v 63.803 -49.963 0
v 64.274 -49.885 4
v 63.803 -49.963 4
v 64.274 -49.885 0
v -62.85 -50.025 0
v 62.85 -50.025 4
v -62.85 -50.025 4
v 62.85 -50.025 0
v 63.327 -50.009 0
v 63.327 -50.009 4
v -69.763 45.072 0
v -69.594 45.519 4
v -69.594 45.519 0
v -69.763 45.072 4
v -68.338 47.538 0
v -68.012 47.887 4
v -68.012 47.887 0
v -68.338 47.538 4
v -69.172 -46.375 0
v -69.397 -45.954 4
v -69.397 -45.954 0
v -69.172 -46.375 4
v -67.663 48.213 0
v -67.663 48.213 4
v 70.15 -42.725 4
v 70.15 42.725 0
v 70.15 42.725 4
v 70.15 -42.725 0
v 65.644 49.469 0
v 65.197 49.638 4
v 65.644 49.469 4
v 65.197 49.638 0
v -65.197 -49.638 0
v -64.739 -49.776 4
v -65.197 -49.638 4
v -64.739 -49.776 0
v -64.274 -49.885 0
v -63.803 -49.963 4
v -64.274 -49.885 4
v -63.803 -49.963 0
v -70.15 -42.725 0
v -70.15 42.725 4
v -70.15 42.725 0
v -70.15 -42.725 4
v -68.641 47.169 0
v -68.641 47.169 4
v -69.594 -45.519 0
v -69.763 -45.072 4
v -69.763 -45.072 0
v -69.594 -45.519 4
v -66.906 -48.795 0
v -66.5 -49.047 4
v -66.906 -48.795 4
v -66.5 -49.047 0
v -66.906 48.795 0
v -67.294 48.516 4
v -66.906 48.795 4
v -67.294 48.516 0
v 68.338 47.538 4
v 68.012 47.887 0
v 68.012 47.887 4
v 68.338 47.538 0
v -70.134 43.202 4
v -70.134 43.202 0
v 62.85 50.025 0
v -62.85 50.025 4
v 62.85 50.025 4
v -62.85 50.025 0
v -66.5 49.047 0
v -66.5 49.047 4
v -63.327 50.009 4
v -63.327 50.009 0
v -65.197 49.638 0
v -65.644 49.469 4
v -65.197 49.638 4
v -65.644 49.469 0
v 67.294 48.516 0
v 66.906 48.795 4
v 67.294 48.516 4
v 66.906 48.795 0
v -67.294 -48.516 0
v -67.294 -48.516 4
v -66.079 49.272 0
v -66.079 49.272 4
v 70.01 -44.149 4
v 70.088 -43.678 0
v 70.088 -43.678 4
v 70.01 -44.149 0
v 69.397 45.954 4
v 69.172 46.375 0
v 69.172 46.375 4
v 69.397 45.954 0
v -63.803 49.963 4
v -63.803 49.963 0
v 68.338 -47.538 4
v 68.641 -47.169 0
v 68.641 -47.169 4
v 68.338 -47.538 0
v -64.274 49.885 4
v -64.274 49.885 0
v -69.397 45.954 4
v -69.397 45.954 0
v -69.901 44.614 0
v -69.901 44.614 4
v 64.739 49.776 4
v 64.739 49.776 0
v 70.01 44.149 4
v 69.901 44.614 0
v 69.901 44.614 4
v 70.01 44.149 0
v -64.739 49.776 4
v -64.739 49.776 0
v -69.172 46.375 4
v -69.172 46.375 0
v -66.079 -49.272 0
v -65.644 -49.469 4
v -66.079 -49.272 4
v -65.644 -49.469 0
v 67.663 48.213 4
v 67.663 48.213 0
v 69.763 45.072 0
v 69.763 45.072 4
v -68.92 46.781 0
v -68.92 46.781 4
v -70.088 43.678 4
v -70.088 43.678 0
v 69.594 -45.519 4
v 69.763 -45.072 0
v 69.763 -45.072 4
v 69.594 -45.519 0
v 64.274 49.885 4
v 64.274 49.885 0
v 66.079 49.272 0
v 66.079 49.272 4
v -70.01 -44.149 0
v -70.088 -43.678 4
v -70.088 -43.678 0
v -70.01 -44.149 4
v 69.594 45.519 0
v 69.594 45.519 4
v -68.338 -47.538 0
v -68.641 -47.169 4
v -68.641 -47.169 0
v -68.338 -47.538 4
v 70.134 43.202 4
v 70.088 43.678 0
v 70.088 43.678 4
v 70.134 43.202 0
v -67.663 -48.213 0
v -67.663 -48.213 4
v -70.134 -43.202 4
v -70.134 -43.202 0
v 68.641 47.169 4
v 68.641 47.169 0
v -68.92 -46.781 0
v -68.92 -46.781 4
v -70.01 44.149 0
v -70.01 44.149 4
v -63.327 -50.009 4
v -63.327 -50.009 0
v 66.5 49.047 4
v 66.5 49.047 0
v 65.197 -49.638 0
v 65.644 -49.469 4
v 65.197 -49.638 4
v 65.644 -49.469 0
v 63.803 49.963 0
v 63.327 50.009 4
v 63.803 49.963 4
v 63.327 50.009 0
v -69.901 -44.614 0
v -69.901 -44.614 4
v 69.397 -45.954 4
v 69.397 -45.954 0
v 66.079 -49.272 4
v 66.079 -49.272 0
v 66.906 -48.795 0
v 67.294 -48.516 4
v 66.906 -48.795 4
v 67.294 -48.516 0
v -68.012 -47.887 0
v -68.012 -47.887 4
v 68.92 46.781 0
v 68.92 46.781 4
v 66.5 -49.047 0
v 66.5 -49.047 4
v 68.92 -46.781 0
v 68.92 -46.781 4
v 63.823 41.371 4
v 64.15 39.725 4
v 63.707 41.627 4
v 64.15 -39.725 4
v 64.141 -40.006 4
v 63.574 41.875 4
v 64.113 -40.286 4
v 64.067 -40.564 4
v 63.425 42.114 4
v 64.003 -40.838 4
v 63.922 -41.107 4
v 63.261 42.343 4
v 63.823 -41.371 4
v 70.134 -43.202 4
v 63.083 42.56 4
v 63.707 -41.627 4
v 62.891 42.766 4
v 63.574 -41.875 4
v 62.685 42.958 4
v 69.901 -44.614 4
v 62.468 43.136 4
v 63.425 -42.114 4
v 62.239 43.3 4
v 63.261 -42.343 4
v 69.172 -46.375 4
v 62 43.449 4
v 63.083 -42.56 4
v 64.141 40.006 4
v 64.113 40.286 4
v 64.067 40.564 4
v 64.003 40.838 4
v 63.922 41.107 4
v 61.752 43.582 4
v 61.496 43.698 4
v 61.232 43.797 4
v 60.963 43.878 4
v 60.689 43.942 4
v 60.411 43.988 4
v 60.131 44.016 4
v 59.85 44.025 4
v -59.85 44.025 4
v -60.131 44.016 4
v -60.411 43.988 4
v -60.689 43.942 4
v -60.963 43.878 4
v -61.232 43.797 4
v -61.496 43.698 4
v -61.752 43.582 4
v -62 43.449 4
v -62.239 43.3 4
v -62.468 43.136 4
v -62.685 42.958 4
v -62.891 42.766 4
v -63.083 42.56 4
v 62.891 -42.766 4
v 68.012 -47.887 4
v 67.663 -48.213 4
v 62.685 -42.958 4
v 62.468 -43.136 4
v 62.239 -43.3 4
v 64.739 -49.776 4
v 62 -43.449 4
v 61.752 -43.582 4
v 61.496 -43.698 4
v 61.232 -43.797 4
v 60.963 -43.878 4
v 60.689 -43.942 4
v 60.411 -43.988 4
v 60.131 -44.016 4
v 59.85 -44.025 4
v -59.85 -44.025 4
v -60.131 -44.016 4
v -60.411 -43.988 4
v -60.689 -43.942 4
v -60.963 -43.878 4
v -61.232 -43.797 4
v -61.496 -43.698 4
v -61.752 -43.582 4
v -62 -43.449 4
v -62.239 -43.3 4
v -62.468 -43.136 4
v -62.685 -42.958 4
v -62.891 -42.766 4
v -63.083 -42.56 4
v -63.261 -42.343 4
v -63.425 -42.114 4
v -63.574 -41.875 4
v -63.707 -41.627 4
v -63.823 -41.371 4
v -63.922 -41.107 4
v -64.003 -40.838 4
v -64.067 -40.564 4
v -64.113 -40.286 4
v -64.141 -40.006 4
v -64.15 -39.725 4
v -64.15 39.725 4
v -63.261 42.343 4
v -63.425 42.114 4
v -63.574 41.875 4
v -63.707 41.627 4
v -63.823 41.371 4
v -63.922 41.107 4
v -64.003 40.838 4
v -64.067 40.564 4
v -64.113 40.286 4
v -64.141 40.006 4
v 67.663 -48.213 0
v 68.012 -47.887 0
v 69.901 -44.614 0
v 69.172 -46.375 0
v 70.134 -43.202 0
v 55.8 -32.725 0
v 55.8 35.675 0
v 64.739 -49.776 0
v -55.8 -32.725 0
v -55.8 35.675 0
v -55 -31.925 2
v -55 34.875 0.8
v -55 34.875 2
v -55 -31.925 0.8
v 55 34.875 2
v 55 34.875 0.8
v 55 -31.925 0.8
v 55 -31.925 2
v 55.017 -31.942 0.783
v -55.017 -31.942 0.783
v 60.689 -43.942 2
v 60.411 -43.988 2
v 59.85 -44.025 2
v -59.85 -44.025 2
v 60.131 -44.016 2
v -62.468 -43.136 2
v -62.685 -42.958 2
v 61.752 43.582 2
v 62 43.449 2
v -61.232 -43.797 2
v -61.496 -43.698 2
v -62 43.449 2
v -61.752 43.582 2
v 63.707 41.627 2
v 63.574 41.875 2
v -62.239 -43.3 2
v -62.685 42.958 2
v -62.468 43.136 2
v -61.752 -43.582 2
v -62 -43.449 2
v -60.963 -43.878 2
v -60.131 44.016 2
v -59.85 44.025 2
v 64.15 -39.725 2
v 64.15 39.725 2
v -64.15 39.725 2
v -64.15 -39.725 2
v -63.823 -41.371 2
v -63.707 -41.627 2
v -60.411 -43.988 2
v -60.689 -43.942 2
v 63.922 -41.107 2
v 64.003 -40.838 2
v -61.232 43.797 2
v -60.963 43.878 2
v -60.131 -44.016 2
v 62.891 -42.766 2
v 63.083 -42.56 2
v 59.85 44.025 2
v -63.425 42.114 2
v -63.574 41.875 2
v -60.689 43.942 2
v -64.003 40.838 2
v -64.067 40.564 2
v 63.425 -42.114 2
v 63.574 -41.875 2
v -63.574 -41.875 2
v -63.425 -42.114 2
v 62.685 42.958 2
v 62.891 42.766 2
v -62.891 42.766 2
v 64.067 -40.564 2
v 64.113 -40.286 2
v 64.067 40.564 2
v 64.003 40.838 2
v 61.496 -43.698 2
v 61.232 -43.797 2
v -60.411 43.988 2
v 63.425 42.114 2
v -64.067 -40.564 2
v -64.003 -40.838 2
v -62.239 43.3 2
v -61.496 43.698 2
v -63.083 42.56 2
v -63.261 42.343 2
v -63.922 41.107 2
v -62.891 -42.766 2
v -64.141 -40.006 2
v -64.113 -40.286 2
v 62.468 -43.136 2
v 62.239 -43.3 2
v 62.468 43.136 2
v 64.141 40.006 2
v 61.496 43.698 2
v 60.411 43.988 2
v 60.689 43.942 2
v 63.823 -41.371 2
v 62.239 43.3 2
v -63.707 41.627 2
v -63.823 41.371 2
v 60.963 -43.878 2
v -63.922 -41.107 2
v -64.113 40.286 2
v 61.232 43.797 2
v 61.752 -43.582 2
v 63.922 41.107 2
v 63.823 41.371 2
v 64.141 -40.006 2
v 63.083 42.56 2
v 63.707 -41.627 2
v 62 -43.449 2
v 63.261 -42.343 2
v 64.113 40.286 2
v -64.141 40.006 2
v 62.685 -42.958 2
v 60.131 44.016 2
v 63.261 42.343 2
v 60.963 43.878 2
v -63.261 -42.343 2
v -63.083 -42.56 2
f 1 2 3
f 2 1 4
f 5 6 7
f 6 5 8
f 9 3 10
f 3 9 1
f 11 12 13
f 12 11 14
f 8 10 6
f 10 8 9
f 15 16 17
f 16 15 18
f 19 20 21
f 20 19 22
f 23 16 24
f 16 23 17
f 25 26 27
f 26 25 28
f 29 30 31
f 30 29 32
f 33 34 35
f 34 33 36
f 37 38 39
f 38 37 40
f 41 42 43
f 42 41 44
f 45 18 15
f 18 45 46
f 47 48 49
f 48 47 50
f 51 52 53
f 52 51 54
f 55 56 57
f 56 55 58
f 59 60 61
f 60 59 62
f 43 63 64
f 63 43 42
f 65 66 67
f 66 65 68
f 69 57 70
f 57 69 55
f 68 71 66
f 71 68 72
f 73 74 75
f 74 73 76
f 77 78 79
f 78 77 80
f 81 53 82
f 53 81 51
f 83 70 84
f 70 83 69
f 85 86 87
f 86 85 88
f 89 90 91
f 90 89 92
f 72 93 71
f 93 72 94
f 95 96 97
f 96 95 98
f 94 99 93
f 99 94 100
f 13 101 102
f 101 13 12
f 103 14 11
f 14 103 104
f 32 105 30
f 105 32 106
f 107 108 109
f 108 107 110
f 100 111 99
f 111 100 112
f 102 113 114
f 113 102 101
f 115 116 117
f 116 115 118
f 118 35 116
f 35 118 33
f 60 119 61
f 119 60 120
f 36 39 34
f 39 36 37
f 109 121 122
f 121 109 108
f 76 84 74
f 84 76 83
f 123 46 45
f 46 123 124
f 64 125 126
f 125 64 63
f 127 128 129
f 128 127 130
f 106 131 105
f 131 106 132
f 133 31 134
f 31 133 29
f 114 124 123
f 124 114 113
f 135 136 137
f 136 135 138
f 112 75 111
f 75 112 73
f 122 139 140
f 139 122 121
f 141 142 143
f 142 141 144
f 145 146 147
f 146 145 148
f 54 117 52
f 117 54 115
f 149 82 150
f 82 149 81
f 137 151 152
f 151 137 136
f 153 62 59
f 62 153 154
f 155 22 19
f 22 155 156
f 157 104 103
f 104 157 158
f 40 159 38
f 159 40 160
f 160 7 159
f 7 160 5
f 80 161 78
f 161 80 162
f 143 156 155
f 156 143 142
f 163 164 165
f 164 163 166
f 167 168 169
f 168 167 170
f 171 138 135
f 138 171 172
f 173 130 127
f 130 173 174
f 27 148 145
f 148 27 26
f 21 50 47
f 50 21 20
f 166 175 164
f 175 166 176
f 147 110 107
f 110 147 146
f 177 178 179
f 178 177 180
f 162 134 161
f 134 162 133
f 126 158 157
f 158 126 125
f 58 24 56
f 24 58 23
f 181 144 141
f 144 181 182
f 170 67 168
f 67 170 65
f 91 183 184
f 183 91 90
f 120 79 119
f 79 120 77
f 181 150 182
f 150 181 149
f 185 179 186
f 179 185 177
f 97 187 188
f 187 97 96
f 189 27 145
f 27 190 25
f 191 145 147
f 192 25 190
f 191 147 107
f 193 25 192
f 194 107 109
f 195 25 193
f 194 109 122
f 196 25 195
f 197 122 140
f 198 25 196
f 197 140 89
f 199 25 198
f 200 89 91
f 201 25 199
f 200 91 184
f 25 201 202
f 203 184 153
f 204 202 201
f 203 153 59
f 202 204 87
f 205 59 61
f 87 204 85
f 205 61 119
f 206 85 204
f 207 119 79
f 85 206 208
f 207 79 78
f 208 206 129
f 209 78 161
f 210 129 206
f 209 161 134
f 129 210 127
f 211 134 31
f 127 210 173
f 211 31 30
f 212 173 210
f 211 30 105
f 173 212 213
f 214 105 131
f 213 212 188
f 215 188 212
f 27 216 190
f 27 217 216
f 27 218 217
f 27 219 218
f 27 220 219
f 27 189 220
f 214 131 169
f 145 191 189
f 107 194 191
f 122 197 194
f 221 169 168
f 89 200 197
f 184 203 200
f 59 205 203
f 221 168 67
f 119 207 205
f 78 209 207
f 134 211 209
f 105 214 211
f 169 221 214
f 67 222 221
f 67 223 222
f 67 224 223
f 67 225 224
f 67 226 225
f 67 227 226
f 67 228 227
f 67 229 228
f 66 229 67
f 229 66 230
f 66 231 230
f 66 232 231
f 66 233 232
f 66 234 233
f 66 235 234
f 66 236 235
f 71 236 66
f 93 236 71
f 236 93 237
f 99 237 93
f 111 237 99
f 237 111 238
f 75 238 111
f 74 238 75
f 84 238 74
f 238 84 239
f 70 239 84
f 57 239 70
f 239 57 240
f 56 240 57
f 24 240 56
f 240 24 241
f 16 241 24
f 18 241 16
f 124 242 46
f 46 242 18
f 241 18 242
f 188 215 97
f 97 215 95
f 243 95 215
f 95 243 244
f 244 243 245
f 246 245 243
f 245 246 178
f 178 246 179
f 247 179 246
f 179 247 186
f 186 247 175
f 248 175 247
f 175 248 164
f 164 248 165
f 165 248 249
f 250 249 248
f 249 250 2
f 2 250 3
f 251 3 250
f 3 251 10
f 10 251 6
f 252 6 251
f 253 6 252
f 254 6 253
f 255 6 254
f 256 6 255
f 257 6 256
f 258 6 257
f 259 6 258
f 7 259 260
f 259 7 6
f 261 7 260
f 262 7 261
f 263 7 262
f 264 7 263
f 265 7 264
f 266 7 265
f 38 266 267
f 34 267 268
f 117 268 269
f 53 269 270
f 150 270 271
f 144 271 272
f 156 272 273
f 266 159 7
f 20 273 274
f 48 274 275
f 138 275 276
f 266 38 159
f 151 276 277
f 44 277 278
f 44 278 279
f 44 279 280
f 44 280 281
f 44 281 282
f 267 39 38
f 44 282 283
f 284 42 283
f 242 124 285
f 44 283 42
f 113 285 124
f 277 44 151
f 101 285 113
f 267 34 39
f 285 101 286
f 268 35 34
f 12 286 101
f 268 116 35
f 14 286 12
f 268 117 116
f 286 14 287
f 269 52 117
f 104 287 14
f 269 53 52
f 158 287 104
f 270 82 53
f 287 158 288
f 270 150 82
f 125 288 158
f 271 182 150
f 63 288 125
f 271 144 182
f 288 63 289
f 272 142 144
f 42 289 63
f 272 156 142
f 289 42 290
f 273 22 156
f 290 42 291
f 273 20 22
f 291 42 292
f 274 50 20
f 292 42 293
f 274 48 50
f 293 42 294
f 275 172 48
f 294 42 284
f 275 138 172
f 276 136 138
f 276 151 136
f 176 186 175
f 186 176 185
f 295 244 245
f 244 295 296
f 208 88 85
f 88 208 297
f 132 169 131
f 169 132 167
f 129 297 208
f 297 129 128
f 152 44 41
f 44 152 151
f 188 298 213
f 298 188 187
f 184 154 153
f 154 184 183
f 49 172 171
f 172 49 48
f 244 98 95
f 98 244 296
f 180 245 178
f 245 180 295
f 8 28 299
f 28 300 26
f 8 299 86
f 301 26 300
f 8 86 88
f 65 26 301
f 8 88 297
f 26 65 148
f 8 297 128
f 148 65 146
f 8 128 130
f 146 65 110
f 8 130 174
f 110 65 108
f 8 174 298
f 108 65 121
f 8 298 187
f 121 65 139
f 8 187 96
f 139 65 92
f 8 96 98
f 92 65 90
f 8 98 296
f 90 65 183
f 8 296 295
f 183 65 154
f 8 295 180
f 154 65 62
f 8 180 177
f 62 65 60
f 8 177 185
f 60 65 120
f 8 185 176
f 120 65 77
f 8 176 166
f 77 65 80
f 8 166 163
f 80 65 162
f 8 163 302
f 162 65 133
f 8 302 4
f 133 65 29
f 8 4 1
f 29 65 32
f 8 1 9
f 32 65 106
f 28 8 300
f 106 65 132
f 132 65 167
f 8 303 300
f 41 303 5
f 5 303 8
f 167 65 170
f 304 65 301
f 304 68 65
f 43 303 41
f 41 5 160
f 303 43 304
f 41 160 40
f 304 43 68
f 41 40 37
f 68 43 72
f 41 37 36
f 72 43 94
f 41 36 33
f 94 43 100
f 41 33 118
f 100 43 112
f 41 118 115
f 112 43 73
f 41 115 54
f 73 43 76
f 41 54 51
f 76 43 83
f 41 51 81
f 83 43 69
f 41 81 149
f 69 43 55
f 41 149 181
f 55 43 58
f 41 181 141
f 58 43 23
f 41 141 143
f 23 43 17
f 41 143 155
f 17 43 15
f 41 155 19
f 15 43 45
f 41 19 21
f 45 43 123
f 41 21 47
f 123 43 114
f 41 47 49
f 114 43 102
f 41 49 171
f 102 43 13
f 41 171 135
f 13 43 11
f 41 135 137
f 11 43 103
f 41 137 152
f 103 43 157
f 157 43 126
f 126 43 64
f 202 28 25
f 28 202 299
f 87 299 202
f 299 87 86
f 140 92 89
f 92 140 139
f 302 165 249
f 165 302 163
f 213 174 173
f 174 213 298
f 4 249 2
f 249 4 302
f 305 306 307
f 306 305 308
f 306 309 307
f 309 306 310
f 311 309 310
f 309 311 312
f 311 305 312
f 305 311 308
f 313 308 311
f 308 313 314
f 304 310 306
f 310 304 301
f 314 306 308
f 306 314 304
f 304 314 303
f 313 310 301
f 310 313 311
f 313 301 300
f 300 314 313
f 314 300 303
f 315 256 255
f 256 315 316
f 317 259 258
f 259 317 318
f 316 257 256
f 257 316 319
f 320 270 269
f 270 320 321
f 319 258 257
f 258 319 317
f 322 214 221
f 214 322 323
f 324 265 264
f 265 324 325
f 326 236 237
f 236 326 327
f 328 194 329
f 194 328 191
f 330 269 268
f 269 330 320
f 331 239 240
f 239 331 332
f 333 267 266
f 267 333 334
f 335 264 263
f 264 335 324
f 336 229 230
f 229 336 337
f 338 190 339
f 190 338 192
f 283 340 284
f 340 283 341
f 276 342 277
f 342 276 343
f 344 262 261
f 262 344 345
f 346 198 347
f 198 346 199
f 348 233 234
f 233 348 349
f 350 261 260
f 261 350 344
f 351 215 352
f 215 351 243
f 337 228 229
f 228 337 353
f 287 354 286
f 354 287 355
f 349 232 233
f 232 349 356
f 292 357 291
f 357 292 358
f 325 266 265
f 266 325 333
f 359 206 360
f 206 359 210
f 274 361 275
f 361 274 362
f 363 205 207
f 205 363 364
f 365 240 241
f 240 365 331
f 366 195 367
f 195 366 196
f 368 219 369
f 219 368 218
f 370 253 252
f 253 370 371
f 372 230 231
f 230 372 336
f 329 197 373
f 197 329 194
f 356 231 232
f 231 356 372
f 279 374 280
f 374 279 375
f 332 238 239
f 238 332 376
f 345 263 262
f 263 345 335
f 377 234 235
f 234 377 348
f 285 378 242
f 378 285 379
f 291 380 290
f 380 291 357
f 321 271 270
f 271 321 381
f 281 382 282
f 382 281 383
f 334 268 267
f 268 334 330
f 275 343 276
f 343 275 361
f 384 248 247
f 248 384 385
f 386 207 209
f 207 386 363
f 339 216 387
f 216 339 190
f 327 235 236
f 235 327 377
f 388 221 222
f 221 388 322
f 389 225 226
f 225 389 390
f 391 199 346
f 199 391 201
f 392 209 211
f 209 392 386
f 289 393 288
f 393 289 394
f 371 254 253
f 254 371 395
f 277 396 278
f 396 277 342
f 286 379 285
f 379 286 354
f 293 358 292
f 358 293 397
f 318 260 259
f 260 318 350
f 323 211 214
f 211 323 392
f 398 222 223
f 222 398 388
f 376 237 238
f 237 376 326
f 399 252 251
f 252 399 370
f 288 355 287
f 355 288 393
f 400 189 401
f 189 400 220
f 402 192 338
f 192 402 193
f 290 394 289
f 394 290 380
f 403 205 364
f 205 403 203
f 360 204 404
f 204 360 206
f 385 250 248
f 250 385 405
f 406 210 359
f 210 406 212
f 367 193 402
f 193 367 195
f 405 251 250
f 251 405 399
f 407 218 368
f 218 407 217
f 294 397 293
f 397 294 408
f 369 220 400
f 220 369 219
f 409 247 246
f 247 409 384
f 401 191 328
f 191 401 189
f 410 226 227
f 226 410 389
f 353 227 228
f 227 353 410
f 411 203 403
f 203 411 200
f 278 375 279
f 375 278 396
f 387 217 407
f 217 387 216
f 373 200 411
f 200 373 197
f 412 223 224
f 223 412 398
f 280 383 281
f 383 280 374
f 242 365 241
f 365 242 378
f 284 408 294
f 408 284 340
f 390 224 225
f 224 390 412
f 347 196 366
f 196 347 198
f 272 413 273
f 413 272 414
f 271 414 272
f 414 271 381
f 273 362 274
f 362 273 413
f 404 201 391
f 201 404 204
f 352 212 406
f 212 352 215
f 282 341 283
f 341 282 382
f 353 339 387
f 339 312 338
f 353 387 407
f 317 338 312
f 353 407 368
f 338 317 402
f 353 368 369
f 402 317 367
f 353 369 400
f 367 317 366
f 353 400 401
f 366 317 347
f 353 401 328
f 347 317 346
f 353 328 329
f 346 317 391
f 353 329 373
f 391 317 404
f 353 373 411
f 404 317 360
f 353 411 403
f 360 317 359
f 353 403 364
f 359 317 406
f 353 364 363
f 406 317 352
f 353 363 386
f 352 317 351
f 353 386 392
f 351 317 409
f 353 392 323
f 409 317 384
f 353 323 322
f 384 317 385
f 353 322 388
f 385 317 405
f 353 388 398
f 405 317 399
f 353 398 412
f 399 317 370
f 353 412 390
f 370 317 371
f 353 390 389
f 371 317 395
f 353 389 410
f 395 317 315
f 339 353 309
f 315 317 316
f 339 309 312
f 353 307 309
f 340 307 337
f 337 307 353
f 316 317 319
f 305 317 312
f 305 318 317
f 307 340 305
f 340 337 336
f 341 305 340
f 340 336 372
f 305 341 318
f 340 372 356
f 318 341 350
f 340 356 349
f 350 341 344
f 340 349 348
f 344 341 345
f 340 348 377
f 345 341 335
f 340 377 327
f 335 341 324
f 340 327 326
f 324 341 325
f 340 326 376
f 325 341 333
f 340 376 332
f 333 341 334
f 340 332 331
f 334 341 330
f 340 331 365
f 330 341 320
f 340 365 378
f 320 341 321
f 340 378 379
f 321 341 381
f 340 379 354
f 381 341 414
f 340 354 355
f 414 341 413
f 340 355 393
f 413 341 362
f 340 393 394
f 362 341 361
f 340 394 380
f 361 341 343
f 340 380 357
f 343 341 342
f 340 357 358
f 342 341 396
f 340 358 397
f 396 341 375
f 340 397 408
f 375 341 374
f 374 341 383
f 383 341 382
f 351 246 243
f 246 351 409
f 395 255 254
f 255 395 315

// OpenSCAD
// VMax / Waveshare ESP32-S3-Touch-LCD-5 capacitive, 800x480.
// Units: mm. Print z=0 face down, glass enters from z=4 side.
// Official drawing: ../drawings/waveshare-touch-dimensions.webp
glass_w = 127.70;
glass_h = 87.45;
glass_r = 4;
clearance = 0.30; // per side; design choice, not vendor tolerance
wall = 6;
lip = 2;
pocket_depth = 2; // shallow locating rim, NOT full glass thickness
window_w = 110.00; // 0.50 beyond active area each side
window_h = 66.80;
window_y = 1.475; // active area is 9.35 from top, 12.30 from bottom
window_r = 0; // square opening preserves rectangular active area
chamfer = 0.8; // 45-degree front window edge
$fn = 96;
module rounded_rect(w,h,r) {
    if (r == 0) square([w,h], center=true);
    else offset(r=r) square([w-2*r,h-2*r], center=true);
}
difference() {
    linear_extrude(lip+pocket_depth)
        rounded_rect(glass_w+2*clearance+2*wall,
                     glass_h+2*clearance+2*wall, glass_r+clearance+3);
    translate([0,window_y,-0.01]) linear_extrude(lip+pocket_depth+0.02)
        rounded_rect(window_w,window_h,window_r);
    // Exact tapered rectangle: enlarged at front, nominal at z=chamfer.
    translate([0,window_y,0])
        linear_extrude(height=chamfer,
            scale=[window_w/(window_w+2*chamfer),window_h/(window_h+2*chamfer)])
            square([window_w+2*chamfer,window_h+2*chamfer],center=true);
    translate([0,0,lip]) linear_extrude(pocket_depth+0.01)
        rounded_rect(glass_w+2*clearance,glass_h+2*clearance,glass_r+clearance);
}
